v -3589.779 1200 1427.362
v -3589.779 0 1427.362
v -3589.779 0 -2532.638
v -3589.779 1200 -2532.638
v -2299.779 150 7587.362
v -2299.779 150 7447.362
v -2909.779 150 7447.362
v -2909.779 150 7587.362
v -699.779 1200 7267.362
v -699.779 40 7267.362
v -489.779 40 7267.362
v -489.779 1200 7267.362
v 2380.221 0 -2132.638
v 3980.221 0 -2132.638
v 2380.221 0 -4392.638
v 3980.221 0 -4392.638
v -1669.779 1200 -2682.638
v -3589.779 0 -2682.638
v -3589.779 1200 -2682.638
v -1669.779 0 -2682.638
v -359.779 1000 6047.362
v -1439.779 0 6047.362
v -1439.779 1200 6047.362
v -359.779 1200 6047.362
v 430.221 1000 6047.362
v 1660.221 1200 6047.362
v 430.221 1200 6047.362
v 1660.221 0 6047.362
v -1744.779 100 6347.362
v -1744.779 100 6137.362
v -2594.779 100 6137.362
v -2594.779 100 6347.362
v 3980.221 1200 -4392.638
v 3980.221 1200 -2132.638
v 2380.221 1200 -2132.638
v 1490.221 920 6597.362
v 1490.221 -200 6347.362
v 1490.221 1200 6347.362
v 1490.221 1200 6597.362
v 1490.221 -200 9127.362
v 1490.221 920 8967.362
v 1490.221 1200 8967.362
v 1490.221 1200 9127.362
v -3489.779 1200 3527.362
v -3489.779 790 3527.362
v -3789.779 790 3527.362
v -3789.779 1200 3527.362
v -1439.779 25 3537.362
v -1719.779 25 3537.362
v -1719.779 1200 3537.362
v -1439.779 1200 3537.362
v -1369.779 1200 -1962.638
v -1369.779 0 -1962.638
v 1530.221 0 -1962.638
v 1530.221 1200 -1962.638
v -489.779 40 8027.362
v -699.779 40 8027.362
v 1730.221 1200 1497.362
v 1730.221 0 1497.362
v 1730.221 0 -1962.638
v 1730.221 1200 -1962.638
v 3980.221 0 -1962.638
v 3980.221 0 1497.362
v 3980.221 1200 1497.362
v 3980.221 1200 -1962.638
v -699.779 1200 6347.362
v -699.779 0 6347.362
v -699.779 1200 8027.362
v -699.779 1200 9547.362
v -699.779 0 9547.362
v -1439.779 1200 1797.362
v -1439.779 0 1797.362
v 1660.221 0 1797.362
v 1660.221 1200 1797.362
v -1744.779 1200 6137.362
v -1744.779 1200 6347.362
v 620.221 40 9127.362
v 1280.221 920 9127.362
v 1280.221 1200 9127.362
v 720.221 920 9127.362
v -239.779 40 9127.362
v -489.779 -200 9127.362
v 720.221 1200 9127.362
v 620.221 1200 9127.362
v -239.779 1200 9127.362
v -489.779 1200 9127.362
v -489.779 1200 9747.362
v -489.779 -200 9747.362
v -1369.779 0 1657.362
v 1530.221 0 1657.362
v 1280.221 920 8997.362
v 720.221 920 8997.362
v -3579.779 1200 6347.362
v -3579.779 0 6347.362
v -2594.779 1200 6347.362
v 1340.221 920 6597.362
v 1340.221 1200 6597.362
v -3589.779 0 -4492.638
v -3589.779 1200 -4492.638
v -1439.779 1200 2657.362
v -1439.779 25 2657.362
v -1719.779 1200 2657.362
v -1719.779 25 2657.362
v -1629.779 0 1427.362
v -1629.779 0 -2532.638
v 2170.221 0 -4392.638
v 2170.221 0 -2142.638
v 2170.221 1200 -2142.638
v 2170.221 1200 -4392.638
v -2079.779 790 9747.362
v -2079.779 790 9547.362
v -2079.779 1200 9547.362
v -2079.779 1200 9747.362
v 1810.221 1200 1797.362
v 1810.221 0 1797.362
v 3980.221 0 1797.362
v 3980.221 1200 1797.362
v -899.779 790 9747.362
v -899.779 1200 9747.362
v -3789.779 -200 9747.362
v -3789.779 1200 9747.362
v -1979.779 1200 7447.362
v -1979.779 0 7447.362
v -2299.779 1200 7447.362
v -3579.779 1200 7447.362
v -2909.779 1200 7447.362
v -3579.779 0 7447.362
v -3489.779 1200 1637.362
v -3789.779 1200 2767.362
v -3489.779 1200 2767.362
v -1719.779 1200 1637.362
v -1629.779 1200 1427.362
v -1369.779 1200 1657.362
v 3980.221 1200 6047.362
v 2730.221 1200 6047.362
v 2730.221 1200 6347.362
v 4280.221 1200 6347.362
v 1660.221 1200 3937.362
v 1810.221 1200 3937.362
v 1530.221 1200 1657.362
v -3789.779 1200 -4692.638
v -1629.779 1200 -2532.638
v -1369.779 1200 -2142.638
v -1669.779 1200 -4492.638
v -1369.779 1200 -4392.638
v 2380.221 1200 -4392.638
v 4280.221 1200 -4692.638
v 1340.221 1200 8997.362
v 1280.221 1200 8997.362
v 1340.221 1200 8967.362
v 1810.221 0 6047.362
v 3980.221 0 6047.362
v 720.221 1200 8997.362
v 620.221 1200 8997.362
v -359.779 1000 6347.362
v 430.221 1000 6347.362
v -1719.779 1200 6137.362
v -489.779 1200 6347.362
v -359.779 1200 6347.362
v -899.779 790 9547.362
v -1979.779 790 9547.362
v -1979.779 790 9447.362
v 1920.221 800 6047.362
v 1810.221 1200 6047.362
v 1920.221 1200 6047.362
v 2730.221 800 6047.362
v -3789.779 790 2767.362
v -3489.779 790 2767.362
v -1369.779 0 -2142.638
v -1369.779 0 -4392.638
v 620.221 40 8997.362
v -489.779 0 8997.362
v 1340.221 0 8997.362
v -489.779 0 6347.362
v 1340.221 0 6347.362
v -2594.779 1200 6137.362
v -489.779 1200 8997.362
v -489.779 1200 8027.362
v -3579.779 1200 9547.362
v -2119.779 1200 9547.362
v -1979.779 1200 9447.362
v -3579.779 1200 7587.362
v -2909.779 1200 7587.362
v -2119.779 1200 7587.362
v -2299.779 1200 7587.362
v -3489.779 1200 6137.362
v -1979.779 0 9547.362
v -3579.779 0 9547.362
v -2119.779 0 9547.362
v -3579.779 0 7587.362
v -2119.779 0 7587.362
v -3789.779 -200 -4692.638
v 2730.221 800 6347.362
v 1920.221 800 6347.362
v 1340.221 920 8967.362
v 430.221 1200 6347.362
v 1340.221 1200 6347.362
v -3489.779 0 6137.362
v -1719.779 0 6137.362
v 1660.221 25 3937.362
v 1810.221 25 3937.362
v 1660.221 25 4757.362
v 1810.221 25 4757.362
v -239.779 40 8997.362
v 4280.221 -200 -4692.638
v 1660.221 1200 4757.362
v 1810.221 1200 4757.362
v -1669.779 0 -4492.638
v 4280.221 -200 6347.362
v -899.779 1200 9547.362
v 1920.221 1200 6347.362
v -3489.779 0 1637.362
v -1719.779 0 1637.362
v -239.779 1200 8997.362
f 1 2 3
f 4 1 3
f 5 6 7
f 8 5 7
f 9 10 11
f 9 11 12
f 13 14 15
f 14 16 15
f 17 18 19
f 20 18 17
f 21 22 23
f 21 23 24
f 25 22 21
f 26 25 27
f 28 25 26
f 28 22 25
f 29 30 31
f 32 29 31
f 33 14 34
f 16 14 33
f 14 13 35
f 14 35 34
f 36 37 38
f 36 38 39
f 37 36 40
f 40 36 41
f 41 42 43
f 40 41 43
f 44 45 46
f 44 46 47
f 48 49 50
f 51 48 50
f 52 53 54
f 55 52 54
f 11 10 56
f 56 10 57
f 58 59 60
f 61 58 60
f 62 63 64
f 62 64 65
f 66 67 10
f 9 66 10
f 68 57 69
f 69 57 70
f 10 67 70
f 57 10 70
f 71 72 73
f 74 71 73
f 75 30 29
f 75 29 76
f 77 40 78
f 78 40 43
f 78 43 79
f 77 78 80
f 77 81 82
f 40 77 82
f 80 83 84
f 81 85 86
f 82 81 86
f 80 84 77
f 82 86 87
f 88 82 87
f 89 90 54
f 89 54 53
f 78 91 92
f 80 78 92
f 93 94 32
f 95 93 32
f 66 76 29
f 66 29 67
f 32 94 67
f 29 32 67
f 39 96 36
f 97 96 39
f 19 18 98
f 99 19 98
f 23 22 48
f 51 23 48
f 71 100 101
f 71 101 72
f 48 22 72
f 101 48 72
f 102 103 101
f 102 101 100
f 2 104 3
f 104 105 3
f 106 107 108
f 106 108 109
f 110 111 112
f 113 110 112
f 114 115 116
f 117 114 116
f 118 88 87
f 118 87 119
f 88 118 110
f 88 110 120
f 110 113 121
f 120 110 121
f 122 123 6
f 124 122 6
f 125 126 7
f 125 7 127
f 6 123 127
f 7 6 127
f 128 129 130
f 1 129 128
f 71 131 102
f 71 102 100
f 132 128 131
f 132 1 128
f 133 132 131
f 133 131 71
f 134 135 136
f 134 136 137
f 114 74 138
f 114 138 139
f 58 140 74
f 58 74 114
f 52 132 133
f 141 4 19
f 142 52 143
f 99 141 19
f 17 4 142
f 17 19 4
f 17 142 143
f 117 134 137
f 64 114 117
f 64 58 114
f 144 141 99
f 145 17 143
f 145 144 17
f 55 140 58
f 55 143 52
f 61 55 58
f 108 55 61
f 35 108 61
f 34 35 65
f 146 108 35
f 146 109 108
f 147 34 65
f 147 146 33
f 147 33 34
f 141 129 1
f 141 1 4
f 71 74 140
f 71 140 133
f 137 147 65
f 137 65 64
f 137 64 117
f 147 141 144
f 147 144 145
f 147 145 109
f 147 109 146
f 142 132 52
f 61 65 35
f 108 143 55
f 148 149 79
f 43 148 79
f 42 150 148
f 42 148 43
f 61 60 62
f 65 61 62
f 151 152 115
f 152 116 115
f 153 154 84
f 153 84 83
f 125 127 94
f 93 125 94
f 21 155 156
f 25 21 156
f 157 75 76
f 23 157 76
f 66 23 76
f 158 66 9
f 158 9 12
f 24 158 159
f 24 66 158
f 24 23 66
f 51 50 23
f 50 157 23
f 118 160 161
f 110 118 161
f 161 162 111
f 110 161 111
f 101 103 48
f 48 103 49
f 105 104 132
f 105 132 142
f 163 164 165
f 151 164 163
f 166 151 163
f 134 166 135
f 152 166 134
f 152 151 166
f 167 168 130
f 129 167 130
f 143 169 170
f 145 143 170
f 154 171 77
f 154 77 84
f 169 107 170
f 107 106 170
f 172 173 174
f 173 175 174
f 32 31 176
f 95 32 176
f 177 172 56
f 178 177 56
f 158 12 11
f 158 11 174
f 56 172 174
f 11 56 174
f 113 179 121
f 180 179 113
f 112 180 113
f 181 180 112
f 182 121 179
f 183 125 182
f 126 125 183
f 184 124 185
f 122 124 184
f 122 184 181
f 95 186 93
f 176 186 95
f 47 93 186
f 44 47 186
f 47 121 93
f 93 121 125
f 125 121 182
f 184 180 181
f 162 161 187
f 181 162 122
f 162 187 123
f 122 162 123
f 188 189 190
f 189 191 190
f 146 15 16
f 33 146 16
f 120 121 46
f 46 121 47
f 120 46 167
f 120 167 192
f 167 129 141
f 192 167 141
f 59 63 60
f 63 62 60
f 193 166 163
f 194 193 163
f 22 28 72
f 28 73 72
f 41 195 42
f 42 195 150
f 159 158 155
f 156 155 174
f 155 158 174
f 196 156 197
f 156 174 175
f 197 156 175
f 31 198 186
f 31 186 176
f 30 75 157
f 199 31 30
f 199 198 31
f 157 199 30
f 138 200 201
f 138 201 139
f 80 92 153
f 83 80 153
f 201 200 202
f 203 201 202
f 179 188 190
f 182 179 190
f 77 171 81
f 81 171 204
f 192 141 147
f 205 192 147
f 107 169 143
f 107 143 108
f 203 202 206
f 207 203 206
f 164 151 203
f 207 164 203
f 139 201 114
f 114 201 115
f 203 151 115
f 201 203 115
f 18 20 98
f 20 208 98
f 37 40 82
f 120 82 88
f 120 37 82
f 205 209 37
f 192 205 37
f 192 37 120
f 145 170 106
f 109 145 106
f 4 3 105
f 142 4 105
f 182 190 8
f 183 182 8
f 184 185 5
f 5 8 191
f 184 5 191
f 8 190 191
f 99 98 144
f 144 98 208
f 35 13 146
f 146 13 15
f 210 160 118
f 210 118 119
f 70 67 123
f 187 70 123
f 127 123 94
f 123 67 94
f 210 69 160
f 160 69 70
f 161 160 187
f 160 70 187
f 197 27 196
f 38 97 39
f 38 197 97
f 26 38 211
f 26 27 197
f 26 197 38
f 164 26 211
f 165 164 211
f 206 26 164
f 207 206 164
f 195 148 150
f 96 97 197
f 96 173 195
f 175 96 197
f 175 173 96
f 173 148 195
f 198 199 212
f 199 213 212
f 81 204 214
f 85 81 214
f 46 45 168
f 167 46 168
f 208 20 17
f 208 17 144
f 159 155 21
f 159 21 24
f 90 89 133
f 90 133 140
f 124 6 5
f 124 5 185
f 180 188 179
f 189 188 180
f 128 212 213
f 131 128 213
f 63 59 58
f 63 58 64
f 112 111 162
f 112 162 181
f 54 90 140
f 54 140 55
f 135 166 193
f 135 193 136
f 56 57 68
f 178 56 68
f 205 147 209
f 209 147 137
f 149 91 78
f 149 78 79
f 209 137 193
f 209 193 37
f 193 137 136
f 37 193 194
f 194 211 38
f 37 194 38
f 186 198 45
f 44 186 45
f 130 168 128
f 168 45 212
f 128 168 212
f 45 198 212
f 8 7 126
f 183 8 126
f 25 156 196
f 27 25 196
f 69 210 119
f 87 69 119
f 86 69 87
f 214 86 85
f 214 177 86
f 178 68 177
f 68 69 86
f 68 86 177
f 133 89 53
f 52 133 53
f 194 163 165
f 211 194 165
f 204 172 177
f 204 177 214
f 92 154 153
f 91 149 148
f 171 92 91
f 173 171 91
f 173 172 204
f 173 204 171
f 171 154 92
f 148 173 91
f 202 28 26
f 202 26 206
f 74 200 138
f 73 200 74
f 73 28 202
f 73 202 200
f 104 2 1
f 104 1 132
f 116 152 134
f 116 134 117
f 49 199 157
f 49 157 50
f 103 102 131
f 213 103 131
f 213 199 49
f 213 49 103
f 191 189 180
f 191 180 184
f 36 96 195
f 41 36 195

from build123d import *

# Parameters (mm, degrees)
SKETCH_1_W             = 1920
SKETCH_1_H             = 1810
SKETCH_1_W_2           = 1960
SKETCH_1_H_2           = 3960
SKETCH_1_W_3           = 1600
SKETCH_1_H_3           = 2260
SKETCH_1_W_4           = 2170
SKETCH_1_H_4           = 4250
SKETCH_1_W_5           = 3540
SKETCH_1_H_5           = 2250
SKETCH_1_W_6           = 2250
SKETCH_1_H_6           = 3460
SKETCH_1_W_7           = 2900
SKETCH_1_H_7           = 3620
SKETCH_1_W_8           = 1460
SKETCH_1_H_8           = 1960
SKETCH_1_W_9           = 1830
SKETCH_1_H_9           = 2650
SKETCH_1_W_10          = 3100
SKETCH_1_W_11          = 1770
SKETCH_1_H_10          = 4500
EXTRUDE_1796_DEPTH     = 2580
EXTRUDE_2026_DEPTH     = 200
SKETCH_5_W             = 760
SKETCH_5_H             = 1290
CUT_EXTRUDE_2294_DEPTH = 12730.50759415
SKETCH_7_W             = 1180
SKETCH_7_H             = 1220
CUT_EXTRUDE_2534_DEPTH = 15092.53046452
CHAMFER_1_SIZE         = 100
CUT_EXTRUDE_2822_REACH = 12120.51
SKETCH_10_W            = 790
SKETCH_10_H            = 1070
CUT_EXTRUDE_3074_REACH = 14575.702
SKETCH_11_W            = 860
SKETCH_11_H            = 1930
CUT_EXTRUDE_3320_REACH = 13130.454
SKETCH_12_W            = 610
SKETCH_12_H            = 1730
CUT_EXTRUDE_3576_REACH = 11929.514
SKETCH_13_W            = 850
SKETCH_13_H            = 1850
CUT_EXTRUDE_3824_REACH = 11735.178
SKETCH_15_W            = 880
SKETCH_15_H            = 1775
CUT_EXTRUDE_4057_REACH = 11847.855
SKETCH_16_W            = 810
SKETCH_16_H            = 1240
CUT_EXTRUDE_4303_REACH = 11463.674
SKETCH_17_W            = 820
SKETCH_17_H            = 2055
CUT_EXTRUDE_4598_REACH = 14575.702
SKETCH_19_W            = 560
SKETCH_19_H            = 1150
CUT_EXTRUDE_4844_REACH = 11315.017
SKETCH_20_W            = 2370
SKETCH_20_H            = 1150
CUT_EXTRUDE_5188_REACH = 11247.793
SKETCH_22_W            = 760
SKETCH_22_H            = 1890
SKETCH_21_W            = 8095.85133769
SKETCH_21_H            = 14487.658310263
CUT_EXTRUDE_5242_DEPTH = 1380


with BuildPart() as part:
    # Эскиз1 → Extrude 1796 (new body)
    with BuildSketch(Plane(origin=(0, 0, 0), x_dir=(1, 0, 0), z_dir=(0, 1, 0))):
        Polygon((-3789.779005525, -9747.361878453), (-489.779005525, -9747.361878453), (-489.779005525, -9127.361878453), (1490.220994475, -9127.361878453), (1490.220994475, -6347.361878453), (4280.220994475, -6347.361878453), (4280.220994475, 4692.638121547), (-3789.779005525, 4692.638121547), align=None)
        with Locations((-2629.779005525, 3587.638121547)):
            Rectangle(SKETCH_1_W, SKETCH_1_H, mode=Mode.SUBTRACT)
        with Locations((-2609.779005525, 552.638121547)):
            Rectangle(SKETCH_1_W_2, SKETCH_1_H_2, mode=Mode.SUBTRACT)
        with Locations((3180.220994475, 3262.638121547)):
            Rectangle(SKETCH_1_W_3, SKETCH_1_H_3, mode=Mode.SUBTRACT)
        with Locations((2895.220994475, -3922.361878453)):
            Rectangle(SKETCH_1_W_4, SKETCH_1_H_4, mode=Mode.SUBTRACT)
        with Locations((400.220994475, 3267.638121547)):
            Rectangle(SKETCH_1_W_5, SKETCH_1_H_5, mode=Mode.SUBTRACT)
        with Locations((2855.220994475, 232.638121547)):
            Rectangle(SKETCH_1_W_6, SKETCH_1_H_6, mode=Mode.SUBTRACT)
        with Locations((80.220994475, 152.638121547)):
            Rectangle(SKETCH_1_W_7, SKETCH_1_H_7, mode=Mode.SUBTRACT)
        Polygon((-699.779005525, -6347.361878453), (-699.779005525, -9547.361878453), (-1979.779005525, -9547.361878453), (-1979.779005525, -7447.361878453), (-3579.779005525, -7447.361878453), (-3579.779005525, -6347.361878453), align=None, mode=Mode.SUBTRACT)
        with Locations((-2849.779005525, -8567.361878453)):
            Rectangle(SKETCH_1_W_8, SKETCH_1_H_8, mode=Mode.SUBTRACT)
        with Locations((425.220994475, -7672.361878453)):
            Rectangle(SKETCH_1_W_9, SKETCH_1_H_9, mode=Mode.SUBTRACT)
        with Locations((110.220994475, -3922.361878453)):
            Rectangle(SKETCH_1_W_10, SKETCH_1_H_4, mode=Mode.SUBTRACT)
        with Locations((-2604.779005525, -3887.361878453)):
            Rectangle(SKETCH_1_W_11, SKETCH_1_H_10, mode=Mode.SUBTRACT)
    extrude(amount=EXTRUDE_1796_DEPTH)

    # Эскиз4 → Extrude 2026 (add)
    with BuildSketch(Plane(origin=(0, 0, 0), x_dir=(1, 0, 0), z_dir=(0, 1, 0))):
        Polygon((-3789.779005525, 4692.638121547), (4280.220994475, 4692.638121547), (4280.220994475, -6347.361878453), (1490.220994475, -6347.361878453), (1490.220994475, -9127.361878453), (-489.779005525, -9127.361878453), (-489.779005525, -9747.361878453), (-3789.779005525, -9747.361878453), align=None)
    extrude(amount=-EXTRUDE_2026_DEPTH)

    # Эскиз5 → Cut-Extrude 2294 (cut, through all)
    with BuildSketch(Plane(origin=(-3489.779005525, 0, 0), x_dir=(0, 0, -1), z_dir=(1, 0, 0))):
        with Locations((-3147.361878453, 1435)):
            Rectangle(SKETCH_5_W, SKETCH_5_H)
    extrude(amount=-CUT_EXTRUDE_2294_DEPTH, mode=Mode.SUBTRACT)

    # Эскиз7 → Cut-Extrude 2534 (cut, through all)
    with BuildSketch(Plane(origin=(0, 0, 9547.361878453), x_dir=(-1, 0, 0), z_dir=(0, 0, -1))):
        with Locations((1489.779005525, 1400)):
            Rectangle(SKETCH_7_W, SKETCH_7_H)
    extrude(amount=-CUT_EXTRUDE_2534_DEPTH, mode=Mode.SUBTRACT)

    # Фаска1
    chamfer_1_edges = [part.edges().sort_by_distance(p)[0] for p in [
        (-1979.779005525, 1400, 9547.361878453),
    ]]
    chamfer(chamfer_1_edges, length=CHAMFER_1_SIZE - 0.0001)  # a hair under: the kernel refuses the full size

    # Эскиз10 → Cut-Extrude 2822 (cut, up to next)
    with BuildSketch(Plane.XY.offset(6347.361878453), mode=Mode.PRIVATE) as cut_extrude_2822_sk1:
        with Locations((35.220994475, 1535)):
            Rectangle(SKETCH_10_W, SKETCH_10_H)
    cut_extrude_2822_tool1 = extrude(cut_extrude_2822_sk1.sketch, amount=-CUT_EXTRUDE_2822_REACH, mode=Mode.PRIVATE) & part.part
    add(cut_extrude_2822_tool1.solids().sort_by_distance((35.220994, 1535, 6347.361878))[0], mode=Mode.SUBTRACT)

    # Эскиз11 → Cut-Extrude 3074 (cut, up to next)
    with BuildSketch(Plane(origin=(0, 0, 8997.361878453), x_dir=(-1, 0, 0), z_dir=(0, 0, -1)), mode=Mode.PRIVATE) as cut_extrude_3074_sk1:
        with Locations((-190.220994475, 1005)):
            Rectangle(SKETCH_11_W, SKETCH_11_H)
    cut_extrude_3074_tool1 = extrude(cut_extrude_3074_sk1.sketch, amount=-CUT_EXTRUDE_3074_REACH, mode=Mode.PRIVATE) & part.part
    add(cut_extrude_3074_tool1.solids().sort_by_distance((190.220994, 1005, 8997.361878))[0], mode=Mode.SUBTRACT)

    # Эскиз12 → Cut-Extrude 3320 (cut, up to next)
    with BuildSketch(Plane(origin=(0, 0, 7447.361878453), x_dir=(-1, 0, 0), z_dir=(0, 0, -1)), mode=Mode.PRIVATE) as cut_extrude_3320_sk1:
        with Locations((2604.779005525, 1015)):
            Rectangle(SKETCH_12_W, SKETCH_12_H)
    cut_extrude_3320_tool1 = extrude(cut_extrude_3320_sk1.sketch, amount=-CUT_EXTRUDE_3320_REACH, mode=Mode.PRIVATE) & part.part
    add(cut_extrude_3320_tool1.solids().sort_by_distance((-2604.779006, 1015, 7447.361878))[0], mode=Mode.SUBTRACT)

    # Эскиз13 → Cut-Extrude 3576 (cut, up to next)
    with BuildSketch(Plane(origin=(0, 0, 6137.361878453), x_dir=(-1, 0, 0), z_dir=(0, 0, -1)), mode=Mode.PRIVATE) as cut_extrude_3576_sk1:
        with Locations((2169.779005525, 1025)):
            Rectangle(SKETCH_13_W, SKETCH_13_H)
    cut_extrude_3576_tool1 = extrude(cut_extrude_3576_sk1.sketch, amount=-CUT_EXTRUDE_3576_REACH, mode=Mode.PRIVATE) & part.part
    add(cut_extrude_3576_tool1.solids().sort_by_distance((-2169.779006, 1025, 6137.361878))[0], mode=Mode.SUBTRACT)

    # Эскиз15 → Cut-Extrude 3824 (cut, up to next)
    with BuildSketch(Plane.ZY.offset(1719.779005525), mode=Mode.PRIVATE) as cut_extrude_3824_sk1:
        with Locations((3097.361878453, 912.5)):
            Rectangle(SKETCH_15_W, SKETCH_15_H)
    cut_extrude_3824_tool1 = extrude(cut_extrude_3824_sk1.sketch, amount=-CUT_EXTRUDE_3824_REACH, mode=Mode.PRIVATE) & part.part
    add(cut_extrude_3824_tool1.solids().sort_by_distance((-1719.779006, 912.5, 3097.361878))[0], mode=Mode.SUBTRACT)

    # Эскиз16 → Cut-Extrude 4057 (cut, up to next)
    with BuildSketch(Plane(origin=(0, 0, 6047.361878453), x_dir=(-1, 0, 0), z_dir=(0, 0, -1)), mode=Mode.PRIVATE) as cut_extrude_4057_sk1:
        with Locations((-2325.220994475, 1420)):
            Rectangle(SKETCH_16_W, SKETCH_16_H)
    cut_extrude_4057_tool1 = extrude(cut_extrude_4057_sk1.sketch, amount=-CUT_EXTRUDE_4057_REACH, mode=Mode.PRIVATE) & part.part
    add(cut_extrude_4057_tool1.solids().sort_by_distance((2325.220994, 1420, 6047.361878))[0], mode=Mode.SUBTRACT)

    # Эскиз17 → Cut-Extrude 4303 (cut, up to next)
    with BuildSketch(Plane.ZY.offset(-1660.220994475), mode=Mode.PRIVATE) as cut_extrude_4303_sk1:
        with Locations((4347.361878453, 1052.5)):
            Rectangle(SKETCH_17_W, SKETCH_17_H)
    cut_extrude_4303_tool1 = extrude(cut_extrude_4303_sk1.sketch, amount=-CUT_EXTRUDE_4303_REACH, mode=Mode.PRIVATE) & part.part
    add(cut_extrude_4303_tool1.solids().sort_by_distance((1660.220994, 1052.5, 4347.361878))[0], mode=Mode.SUBTRACT)

    # Эскиз19 → Cut-Extrude 4598 (cut, up to next)
    with BuildSketch(Plane(origin=(0, 0, 8997.361878453), x_dir=(-1, 0, 0), z_dir=(0, 0, -1)), mode=Mode.PRIVATE) as cut_extrude_4598_sk1:
        with Locations((-1000.220994475, 1495)):
            Rectangle(SKETCH_19_W, SKETCH_19_H)
    cut_extrude_4598_tool1 = extrude(cut_extrude_4598_sk1.sketch, amount=-CUT_EXTRUDE_4598_REACH, mode=Mode.PRIVATE) & part.part
    add(cut_extrude_4598_tool1.solids().sort_by_distance((1000.220994, 1495, 8997.361878))[0], mode=Mode.SUBTRACT)

    # Эскиз20 → Cut-Extrude 4844 (cut, up to next)
    with BuildSketch(Plane.ZY.offset(-1340.220994475), mode=Mode.PRIVATE) as cut_extrude_4844_sk1:
        with Locations((7782.361878453, 1495)):
            Rectangle(SKETCH_20_W, SKETCH_20_H)
    cut_extrude_4844_tool1 = extrude(cut_extrude_4844_sk1.sketch, amount=-CUT_EXTRUDE_4844_REACH, mode=Mode.PRIVATE) & part.part
    add(cut_extrude_4844_tool1.solids().sort_by_distance((1340.220994, 1495, 7782.361878))[0], mode=Mode.SUBTRACT)

    # Эскиз22 → Cut-Extrude 5188 (cut, up to next)
    with BuildSketch(Plane.ZY.offset(699.779005525), mode=Mode.PRIVATE) as cut_extrude_5188_sk1:
        with Locations((7647.361878453, 985)):
            Rectangle(SKETCH_22_W, SKETCH_22_H)
    cut_extrude_5188_tool1 = extrude(cut_extrude_5188_sk1.sketch, amount=-CUT_EXTRUDE_5188_REACH, mode=Mode.PRIVATE) & part.part
    add(cut_extrude_5188_tool1.solids().sort_by_distance((-699.779006, 985, 7647.361878))[0], mode=Mode.SUBTRACT)

    # Эскиз21 → Cut-Extrude 5242 (cut)
    with BuildSketch(Plane(origin=(0, 2580, 0), x_dir=(1, 0, 0), z_dir=(0, 1, 0))):
        with Locations((258.14666332, -2551.191033585)):
            Rectangle(SKETCH_21_W, SKETCH_21_H)
    extrude(amount=-CUT_EXTRUDE_5242_DEPTH, mode=Mode.SUBTRACT)


solid = part.part
